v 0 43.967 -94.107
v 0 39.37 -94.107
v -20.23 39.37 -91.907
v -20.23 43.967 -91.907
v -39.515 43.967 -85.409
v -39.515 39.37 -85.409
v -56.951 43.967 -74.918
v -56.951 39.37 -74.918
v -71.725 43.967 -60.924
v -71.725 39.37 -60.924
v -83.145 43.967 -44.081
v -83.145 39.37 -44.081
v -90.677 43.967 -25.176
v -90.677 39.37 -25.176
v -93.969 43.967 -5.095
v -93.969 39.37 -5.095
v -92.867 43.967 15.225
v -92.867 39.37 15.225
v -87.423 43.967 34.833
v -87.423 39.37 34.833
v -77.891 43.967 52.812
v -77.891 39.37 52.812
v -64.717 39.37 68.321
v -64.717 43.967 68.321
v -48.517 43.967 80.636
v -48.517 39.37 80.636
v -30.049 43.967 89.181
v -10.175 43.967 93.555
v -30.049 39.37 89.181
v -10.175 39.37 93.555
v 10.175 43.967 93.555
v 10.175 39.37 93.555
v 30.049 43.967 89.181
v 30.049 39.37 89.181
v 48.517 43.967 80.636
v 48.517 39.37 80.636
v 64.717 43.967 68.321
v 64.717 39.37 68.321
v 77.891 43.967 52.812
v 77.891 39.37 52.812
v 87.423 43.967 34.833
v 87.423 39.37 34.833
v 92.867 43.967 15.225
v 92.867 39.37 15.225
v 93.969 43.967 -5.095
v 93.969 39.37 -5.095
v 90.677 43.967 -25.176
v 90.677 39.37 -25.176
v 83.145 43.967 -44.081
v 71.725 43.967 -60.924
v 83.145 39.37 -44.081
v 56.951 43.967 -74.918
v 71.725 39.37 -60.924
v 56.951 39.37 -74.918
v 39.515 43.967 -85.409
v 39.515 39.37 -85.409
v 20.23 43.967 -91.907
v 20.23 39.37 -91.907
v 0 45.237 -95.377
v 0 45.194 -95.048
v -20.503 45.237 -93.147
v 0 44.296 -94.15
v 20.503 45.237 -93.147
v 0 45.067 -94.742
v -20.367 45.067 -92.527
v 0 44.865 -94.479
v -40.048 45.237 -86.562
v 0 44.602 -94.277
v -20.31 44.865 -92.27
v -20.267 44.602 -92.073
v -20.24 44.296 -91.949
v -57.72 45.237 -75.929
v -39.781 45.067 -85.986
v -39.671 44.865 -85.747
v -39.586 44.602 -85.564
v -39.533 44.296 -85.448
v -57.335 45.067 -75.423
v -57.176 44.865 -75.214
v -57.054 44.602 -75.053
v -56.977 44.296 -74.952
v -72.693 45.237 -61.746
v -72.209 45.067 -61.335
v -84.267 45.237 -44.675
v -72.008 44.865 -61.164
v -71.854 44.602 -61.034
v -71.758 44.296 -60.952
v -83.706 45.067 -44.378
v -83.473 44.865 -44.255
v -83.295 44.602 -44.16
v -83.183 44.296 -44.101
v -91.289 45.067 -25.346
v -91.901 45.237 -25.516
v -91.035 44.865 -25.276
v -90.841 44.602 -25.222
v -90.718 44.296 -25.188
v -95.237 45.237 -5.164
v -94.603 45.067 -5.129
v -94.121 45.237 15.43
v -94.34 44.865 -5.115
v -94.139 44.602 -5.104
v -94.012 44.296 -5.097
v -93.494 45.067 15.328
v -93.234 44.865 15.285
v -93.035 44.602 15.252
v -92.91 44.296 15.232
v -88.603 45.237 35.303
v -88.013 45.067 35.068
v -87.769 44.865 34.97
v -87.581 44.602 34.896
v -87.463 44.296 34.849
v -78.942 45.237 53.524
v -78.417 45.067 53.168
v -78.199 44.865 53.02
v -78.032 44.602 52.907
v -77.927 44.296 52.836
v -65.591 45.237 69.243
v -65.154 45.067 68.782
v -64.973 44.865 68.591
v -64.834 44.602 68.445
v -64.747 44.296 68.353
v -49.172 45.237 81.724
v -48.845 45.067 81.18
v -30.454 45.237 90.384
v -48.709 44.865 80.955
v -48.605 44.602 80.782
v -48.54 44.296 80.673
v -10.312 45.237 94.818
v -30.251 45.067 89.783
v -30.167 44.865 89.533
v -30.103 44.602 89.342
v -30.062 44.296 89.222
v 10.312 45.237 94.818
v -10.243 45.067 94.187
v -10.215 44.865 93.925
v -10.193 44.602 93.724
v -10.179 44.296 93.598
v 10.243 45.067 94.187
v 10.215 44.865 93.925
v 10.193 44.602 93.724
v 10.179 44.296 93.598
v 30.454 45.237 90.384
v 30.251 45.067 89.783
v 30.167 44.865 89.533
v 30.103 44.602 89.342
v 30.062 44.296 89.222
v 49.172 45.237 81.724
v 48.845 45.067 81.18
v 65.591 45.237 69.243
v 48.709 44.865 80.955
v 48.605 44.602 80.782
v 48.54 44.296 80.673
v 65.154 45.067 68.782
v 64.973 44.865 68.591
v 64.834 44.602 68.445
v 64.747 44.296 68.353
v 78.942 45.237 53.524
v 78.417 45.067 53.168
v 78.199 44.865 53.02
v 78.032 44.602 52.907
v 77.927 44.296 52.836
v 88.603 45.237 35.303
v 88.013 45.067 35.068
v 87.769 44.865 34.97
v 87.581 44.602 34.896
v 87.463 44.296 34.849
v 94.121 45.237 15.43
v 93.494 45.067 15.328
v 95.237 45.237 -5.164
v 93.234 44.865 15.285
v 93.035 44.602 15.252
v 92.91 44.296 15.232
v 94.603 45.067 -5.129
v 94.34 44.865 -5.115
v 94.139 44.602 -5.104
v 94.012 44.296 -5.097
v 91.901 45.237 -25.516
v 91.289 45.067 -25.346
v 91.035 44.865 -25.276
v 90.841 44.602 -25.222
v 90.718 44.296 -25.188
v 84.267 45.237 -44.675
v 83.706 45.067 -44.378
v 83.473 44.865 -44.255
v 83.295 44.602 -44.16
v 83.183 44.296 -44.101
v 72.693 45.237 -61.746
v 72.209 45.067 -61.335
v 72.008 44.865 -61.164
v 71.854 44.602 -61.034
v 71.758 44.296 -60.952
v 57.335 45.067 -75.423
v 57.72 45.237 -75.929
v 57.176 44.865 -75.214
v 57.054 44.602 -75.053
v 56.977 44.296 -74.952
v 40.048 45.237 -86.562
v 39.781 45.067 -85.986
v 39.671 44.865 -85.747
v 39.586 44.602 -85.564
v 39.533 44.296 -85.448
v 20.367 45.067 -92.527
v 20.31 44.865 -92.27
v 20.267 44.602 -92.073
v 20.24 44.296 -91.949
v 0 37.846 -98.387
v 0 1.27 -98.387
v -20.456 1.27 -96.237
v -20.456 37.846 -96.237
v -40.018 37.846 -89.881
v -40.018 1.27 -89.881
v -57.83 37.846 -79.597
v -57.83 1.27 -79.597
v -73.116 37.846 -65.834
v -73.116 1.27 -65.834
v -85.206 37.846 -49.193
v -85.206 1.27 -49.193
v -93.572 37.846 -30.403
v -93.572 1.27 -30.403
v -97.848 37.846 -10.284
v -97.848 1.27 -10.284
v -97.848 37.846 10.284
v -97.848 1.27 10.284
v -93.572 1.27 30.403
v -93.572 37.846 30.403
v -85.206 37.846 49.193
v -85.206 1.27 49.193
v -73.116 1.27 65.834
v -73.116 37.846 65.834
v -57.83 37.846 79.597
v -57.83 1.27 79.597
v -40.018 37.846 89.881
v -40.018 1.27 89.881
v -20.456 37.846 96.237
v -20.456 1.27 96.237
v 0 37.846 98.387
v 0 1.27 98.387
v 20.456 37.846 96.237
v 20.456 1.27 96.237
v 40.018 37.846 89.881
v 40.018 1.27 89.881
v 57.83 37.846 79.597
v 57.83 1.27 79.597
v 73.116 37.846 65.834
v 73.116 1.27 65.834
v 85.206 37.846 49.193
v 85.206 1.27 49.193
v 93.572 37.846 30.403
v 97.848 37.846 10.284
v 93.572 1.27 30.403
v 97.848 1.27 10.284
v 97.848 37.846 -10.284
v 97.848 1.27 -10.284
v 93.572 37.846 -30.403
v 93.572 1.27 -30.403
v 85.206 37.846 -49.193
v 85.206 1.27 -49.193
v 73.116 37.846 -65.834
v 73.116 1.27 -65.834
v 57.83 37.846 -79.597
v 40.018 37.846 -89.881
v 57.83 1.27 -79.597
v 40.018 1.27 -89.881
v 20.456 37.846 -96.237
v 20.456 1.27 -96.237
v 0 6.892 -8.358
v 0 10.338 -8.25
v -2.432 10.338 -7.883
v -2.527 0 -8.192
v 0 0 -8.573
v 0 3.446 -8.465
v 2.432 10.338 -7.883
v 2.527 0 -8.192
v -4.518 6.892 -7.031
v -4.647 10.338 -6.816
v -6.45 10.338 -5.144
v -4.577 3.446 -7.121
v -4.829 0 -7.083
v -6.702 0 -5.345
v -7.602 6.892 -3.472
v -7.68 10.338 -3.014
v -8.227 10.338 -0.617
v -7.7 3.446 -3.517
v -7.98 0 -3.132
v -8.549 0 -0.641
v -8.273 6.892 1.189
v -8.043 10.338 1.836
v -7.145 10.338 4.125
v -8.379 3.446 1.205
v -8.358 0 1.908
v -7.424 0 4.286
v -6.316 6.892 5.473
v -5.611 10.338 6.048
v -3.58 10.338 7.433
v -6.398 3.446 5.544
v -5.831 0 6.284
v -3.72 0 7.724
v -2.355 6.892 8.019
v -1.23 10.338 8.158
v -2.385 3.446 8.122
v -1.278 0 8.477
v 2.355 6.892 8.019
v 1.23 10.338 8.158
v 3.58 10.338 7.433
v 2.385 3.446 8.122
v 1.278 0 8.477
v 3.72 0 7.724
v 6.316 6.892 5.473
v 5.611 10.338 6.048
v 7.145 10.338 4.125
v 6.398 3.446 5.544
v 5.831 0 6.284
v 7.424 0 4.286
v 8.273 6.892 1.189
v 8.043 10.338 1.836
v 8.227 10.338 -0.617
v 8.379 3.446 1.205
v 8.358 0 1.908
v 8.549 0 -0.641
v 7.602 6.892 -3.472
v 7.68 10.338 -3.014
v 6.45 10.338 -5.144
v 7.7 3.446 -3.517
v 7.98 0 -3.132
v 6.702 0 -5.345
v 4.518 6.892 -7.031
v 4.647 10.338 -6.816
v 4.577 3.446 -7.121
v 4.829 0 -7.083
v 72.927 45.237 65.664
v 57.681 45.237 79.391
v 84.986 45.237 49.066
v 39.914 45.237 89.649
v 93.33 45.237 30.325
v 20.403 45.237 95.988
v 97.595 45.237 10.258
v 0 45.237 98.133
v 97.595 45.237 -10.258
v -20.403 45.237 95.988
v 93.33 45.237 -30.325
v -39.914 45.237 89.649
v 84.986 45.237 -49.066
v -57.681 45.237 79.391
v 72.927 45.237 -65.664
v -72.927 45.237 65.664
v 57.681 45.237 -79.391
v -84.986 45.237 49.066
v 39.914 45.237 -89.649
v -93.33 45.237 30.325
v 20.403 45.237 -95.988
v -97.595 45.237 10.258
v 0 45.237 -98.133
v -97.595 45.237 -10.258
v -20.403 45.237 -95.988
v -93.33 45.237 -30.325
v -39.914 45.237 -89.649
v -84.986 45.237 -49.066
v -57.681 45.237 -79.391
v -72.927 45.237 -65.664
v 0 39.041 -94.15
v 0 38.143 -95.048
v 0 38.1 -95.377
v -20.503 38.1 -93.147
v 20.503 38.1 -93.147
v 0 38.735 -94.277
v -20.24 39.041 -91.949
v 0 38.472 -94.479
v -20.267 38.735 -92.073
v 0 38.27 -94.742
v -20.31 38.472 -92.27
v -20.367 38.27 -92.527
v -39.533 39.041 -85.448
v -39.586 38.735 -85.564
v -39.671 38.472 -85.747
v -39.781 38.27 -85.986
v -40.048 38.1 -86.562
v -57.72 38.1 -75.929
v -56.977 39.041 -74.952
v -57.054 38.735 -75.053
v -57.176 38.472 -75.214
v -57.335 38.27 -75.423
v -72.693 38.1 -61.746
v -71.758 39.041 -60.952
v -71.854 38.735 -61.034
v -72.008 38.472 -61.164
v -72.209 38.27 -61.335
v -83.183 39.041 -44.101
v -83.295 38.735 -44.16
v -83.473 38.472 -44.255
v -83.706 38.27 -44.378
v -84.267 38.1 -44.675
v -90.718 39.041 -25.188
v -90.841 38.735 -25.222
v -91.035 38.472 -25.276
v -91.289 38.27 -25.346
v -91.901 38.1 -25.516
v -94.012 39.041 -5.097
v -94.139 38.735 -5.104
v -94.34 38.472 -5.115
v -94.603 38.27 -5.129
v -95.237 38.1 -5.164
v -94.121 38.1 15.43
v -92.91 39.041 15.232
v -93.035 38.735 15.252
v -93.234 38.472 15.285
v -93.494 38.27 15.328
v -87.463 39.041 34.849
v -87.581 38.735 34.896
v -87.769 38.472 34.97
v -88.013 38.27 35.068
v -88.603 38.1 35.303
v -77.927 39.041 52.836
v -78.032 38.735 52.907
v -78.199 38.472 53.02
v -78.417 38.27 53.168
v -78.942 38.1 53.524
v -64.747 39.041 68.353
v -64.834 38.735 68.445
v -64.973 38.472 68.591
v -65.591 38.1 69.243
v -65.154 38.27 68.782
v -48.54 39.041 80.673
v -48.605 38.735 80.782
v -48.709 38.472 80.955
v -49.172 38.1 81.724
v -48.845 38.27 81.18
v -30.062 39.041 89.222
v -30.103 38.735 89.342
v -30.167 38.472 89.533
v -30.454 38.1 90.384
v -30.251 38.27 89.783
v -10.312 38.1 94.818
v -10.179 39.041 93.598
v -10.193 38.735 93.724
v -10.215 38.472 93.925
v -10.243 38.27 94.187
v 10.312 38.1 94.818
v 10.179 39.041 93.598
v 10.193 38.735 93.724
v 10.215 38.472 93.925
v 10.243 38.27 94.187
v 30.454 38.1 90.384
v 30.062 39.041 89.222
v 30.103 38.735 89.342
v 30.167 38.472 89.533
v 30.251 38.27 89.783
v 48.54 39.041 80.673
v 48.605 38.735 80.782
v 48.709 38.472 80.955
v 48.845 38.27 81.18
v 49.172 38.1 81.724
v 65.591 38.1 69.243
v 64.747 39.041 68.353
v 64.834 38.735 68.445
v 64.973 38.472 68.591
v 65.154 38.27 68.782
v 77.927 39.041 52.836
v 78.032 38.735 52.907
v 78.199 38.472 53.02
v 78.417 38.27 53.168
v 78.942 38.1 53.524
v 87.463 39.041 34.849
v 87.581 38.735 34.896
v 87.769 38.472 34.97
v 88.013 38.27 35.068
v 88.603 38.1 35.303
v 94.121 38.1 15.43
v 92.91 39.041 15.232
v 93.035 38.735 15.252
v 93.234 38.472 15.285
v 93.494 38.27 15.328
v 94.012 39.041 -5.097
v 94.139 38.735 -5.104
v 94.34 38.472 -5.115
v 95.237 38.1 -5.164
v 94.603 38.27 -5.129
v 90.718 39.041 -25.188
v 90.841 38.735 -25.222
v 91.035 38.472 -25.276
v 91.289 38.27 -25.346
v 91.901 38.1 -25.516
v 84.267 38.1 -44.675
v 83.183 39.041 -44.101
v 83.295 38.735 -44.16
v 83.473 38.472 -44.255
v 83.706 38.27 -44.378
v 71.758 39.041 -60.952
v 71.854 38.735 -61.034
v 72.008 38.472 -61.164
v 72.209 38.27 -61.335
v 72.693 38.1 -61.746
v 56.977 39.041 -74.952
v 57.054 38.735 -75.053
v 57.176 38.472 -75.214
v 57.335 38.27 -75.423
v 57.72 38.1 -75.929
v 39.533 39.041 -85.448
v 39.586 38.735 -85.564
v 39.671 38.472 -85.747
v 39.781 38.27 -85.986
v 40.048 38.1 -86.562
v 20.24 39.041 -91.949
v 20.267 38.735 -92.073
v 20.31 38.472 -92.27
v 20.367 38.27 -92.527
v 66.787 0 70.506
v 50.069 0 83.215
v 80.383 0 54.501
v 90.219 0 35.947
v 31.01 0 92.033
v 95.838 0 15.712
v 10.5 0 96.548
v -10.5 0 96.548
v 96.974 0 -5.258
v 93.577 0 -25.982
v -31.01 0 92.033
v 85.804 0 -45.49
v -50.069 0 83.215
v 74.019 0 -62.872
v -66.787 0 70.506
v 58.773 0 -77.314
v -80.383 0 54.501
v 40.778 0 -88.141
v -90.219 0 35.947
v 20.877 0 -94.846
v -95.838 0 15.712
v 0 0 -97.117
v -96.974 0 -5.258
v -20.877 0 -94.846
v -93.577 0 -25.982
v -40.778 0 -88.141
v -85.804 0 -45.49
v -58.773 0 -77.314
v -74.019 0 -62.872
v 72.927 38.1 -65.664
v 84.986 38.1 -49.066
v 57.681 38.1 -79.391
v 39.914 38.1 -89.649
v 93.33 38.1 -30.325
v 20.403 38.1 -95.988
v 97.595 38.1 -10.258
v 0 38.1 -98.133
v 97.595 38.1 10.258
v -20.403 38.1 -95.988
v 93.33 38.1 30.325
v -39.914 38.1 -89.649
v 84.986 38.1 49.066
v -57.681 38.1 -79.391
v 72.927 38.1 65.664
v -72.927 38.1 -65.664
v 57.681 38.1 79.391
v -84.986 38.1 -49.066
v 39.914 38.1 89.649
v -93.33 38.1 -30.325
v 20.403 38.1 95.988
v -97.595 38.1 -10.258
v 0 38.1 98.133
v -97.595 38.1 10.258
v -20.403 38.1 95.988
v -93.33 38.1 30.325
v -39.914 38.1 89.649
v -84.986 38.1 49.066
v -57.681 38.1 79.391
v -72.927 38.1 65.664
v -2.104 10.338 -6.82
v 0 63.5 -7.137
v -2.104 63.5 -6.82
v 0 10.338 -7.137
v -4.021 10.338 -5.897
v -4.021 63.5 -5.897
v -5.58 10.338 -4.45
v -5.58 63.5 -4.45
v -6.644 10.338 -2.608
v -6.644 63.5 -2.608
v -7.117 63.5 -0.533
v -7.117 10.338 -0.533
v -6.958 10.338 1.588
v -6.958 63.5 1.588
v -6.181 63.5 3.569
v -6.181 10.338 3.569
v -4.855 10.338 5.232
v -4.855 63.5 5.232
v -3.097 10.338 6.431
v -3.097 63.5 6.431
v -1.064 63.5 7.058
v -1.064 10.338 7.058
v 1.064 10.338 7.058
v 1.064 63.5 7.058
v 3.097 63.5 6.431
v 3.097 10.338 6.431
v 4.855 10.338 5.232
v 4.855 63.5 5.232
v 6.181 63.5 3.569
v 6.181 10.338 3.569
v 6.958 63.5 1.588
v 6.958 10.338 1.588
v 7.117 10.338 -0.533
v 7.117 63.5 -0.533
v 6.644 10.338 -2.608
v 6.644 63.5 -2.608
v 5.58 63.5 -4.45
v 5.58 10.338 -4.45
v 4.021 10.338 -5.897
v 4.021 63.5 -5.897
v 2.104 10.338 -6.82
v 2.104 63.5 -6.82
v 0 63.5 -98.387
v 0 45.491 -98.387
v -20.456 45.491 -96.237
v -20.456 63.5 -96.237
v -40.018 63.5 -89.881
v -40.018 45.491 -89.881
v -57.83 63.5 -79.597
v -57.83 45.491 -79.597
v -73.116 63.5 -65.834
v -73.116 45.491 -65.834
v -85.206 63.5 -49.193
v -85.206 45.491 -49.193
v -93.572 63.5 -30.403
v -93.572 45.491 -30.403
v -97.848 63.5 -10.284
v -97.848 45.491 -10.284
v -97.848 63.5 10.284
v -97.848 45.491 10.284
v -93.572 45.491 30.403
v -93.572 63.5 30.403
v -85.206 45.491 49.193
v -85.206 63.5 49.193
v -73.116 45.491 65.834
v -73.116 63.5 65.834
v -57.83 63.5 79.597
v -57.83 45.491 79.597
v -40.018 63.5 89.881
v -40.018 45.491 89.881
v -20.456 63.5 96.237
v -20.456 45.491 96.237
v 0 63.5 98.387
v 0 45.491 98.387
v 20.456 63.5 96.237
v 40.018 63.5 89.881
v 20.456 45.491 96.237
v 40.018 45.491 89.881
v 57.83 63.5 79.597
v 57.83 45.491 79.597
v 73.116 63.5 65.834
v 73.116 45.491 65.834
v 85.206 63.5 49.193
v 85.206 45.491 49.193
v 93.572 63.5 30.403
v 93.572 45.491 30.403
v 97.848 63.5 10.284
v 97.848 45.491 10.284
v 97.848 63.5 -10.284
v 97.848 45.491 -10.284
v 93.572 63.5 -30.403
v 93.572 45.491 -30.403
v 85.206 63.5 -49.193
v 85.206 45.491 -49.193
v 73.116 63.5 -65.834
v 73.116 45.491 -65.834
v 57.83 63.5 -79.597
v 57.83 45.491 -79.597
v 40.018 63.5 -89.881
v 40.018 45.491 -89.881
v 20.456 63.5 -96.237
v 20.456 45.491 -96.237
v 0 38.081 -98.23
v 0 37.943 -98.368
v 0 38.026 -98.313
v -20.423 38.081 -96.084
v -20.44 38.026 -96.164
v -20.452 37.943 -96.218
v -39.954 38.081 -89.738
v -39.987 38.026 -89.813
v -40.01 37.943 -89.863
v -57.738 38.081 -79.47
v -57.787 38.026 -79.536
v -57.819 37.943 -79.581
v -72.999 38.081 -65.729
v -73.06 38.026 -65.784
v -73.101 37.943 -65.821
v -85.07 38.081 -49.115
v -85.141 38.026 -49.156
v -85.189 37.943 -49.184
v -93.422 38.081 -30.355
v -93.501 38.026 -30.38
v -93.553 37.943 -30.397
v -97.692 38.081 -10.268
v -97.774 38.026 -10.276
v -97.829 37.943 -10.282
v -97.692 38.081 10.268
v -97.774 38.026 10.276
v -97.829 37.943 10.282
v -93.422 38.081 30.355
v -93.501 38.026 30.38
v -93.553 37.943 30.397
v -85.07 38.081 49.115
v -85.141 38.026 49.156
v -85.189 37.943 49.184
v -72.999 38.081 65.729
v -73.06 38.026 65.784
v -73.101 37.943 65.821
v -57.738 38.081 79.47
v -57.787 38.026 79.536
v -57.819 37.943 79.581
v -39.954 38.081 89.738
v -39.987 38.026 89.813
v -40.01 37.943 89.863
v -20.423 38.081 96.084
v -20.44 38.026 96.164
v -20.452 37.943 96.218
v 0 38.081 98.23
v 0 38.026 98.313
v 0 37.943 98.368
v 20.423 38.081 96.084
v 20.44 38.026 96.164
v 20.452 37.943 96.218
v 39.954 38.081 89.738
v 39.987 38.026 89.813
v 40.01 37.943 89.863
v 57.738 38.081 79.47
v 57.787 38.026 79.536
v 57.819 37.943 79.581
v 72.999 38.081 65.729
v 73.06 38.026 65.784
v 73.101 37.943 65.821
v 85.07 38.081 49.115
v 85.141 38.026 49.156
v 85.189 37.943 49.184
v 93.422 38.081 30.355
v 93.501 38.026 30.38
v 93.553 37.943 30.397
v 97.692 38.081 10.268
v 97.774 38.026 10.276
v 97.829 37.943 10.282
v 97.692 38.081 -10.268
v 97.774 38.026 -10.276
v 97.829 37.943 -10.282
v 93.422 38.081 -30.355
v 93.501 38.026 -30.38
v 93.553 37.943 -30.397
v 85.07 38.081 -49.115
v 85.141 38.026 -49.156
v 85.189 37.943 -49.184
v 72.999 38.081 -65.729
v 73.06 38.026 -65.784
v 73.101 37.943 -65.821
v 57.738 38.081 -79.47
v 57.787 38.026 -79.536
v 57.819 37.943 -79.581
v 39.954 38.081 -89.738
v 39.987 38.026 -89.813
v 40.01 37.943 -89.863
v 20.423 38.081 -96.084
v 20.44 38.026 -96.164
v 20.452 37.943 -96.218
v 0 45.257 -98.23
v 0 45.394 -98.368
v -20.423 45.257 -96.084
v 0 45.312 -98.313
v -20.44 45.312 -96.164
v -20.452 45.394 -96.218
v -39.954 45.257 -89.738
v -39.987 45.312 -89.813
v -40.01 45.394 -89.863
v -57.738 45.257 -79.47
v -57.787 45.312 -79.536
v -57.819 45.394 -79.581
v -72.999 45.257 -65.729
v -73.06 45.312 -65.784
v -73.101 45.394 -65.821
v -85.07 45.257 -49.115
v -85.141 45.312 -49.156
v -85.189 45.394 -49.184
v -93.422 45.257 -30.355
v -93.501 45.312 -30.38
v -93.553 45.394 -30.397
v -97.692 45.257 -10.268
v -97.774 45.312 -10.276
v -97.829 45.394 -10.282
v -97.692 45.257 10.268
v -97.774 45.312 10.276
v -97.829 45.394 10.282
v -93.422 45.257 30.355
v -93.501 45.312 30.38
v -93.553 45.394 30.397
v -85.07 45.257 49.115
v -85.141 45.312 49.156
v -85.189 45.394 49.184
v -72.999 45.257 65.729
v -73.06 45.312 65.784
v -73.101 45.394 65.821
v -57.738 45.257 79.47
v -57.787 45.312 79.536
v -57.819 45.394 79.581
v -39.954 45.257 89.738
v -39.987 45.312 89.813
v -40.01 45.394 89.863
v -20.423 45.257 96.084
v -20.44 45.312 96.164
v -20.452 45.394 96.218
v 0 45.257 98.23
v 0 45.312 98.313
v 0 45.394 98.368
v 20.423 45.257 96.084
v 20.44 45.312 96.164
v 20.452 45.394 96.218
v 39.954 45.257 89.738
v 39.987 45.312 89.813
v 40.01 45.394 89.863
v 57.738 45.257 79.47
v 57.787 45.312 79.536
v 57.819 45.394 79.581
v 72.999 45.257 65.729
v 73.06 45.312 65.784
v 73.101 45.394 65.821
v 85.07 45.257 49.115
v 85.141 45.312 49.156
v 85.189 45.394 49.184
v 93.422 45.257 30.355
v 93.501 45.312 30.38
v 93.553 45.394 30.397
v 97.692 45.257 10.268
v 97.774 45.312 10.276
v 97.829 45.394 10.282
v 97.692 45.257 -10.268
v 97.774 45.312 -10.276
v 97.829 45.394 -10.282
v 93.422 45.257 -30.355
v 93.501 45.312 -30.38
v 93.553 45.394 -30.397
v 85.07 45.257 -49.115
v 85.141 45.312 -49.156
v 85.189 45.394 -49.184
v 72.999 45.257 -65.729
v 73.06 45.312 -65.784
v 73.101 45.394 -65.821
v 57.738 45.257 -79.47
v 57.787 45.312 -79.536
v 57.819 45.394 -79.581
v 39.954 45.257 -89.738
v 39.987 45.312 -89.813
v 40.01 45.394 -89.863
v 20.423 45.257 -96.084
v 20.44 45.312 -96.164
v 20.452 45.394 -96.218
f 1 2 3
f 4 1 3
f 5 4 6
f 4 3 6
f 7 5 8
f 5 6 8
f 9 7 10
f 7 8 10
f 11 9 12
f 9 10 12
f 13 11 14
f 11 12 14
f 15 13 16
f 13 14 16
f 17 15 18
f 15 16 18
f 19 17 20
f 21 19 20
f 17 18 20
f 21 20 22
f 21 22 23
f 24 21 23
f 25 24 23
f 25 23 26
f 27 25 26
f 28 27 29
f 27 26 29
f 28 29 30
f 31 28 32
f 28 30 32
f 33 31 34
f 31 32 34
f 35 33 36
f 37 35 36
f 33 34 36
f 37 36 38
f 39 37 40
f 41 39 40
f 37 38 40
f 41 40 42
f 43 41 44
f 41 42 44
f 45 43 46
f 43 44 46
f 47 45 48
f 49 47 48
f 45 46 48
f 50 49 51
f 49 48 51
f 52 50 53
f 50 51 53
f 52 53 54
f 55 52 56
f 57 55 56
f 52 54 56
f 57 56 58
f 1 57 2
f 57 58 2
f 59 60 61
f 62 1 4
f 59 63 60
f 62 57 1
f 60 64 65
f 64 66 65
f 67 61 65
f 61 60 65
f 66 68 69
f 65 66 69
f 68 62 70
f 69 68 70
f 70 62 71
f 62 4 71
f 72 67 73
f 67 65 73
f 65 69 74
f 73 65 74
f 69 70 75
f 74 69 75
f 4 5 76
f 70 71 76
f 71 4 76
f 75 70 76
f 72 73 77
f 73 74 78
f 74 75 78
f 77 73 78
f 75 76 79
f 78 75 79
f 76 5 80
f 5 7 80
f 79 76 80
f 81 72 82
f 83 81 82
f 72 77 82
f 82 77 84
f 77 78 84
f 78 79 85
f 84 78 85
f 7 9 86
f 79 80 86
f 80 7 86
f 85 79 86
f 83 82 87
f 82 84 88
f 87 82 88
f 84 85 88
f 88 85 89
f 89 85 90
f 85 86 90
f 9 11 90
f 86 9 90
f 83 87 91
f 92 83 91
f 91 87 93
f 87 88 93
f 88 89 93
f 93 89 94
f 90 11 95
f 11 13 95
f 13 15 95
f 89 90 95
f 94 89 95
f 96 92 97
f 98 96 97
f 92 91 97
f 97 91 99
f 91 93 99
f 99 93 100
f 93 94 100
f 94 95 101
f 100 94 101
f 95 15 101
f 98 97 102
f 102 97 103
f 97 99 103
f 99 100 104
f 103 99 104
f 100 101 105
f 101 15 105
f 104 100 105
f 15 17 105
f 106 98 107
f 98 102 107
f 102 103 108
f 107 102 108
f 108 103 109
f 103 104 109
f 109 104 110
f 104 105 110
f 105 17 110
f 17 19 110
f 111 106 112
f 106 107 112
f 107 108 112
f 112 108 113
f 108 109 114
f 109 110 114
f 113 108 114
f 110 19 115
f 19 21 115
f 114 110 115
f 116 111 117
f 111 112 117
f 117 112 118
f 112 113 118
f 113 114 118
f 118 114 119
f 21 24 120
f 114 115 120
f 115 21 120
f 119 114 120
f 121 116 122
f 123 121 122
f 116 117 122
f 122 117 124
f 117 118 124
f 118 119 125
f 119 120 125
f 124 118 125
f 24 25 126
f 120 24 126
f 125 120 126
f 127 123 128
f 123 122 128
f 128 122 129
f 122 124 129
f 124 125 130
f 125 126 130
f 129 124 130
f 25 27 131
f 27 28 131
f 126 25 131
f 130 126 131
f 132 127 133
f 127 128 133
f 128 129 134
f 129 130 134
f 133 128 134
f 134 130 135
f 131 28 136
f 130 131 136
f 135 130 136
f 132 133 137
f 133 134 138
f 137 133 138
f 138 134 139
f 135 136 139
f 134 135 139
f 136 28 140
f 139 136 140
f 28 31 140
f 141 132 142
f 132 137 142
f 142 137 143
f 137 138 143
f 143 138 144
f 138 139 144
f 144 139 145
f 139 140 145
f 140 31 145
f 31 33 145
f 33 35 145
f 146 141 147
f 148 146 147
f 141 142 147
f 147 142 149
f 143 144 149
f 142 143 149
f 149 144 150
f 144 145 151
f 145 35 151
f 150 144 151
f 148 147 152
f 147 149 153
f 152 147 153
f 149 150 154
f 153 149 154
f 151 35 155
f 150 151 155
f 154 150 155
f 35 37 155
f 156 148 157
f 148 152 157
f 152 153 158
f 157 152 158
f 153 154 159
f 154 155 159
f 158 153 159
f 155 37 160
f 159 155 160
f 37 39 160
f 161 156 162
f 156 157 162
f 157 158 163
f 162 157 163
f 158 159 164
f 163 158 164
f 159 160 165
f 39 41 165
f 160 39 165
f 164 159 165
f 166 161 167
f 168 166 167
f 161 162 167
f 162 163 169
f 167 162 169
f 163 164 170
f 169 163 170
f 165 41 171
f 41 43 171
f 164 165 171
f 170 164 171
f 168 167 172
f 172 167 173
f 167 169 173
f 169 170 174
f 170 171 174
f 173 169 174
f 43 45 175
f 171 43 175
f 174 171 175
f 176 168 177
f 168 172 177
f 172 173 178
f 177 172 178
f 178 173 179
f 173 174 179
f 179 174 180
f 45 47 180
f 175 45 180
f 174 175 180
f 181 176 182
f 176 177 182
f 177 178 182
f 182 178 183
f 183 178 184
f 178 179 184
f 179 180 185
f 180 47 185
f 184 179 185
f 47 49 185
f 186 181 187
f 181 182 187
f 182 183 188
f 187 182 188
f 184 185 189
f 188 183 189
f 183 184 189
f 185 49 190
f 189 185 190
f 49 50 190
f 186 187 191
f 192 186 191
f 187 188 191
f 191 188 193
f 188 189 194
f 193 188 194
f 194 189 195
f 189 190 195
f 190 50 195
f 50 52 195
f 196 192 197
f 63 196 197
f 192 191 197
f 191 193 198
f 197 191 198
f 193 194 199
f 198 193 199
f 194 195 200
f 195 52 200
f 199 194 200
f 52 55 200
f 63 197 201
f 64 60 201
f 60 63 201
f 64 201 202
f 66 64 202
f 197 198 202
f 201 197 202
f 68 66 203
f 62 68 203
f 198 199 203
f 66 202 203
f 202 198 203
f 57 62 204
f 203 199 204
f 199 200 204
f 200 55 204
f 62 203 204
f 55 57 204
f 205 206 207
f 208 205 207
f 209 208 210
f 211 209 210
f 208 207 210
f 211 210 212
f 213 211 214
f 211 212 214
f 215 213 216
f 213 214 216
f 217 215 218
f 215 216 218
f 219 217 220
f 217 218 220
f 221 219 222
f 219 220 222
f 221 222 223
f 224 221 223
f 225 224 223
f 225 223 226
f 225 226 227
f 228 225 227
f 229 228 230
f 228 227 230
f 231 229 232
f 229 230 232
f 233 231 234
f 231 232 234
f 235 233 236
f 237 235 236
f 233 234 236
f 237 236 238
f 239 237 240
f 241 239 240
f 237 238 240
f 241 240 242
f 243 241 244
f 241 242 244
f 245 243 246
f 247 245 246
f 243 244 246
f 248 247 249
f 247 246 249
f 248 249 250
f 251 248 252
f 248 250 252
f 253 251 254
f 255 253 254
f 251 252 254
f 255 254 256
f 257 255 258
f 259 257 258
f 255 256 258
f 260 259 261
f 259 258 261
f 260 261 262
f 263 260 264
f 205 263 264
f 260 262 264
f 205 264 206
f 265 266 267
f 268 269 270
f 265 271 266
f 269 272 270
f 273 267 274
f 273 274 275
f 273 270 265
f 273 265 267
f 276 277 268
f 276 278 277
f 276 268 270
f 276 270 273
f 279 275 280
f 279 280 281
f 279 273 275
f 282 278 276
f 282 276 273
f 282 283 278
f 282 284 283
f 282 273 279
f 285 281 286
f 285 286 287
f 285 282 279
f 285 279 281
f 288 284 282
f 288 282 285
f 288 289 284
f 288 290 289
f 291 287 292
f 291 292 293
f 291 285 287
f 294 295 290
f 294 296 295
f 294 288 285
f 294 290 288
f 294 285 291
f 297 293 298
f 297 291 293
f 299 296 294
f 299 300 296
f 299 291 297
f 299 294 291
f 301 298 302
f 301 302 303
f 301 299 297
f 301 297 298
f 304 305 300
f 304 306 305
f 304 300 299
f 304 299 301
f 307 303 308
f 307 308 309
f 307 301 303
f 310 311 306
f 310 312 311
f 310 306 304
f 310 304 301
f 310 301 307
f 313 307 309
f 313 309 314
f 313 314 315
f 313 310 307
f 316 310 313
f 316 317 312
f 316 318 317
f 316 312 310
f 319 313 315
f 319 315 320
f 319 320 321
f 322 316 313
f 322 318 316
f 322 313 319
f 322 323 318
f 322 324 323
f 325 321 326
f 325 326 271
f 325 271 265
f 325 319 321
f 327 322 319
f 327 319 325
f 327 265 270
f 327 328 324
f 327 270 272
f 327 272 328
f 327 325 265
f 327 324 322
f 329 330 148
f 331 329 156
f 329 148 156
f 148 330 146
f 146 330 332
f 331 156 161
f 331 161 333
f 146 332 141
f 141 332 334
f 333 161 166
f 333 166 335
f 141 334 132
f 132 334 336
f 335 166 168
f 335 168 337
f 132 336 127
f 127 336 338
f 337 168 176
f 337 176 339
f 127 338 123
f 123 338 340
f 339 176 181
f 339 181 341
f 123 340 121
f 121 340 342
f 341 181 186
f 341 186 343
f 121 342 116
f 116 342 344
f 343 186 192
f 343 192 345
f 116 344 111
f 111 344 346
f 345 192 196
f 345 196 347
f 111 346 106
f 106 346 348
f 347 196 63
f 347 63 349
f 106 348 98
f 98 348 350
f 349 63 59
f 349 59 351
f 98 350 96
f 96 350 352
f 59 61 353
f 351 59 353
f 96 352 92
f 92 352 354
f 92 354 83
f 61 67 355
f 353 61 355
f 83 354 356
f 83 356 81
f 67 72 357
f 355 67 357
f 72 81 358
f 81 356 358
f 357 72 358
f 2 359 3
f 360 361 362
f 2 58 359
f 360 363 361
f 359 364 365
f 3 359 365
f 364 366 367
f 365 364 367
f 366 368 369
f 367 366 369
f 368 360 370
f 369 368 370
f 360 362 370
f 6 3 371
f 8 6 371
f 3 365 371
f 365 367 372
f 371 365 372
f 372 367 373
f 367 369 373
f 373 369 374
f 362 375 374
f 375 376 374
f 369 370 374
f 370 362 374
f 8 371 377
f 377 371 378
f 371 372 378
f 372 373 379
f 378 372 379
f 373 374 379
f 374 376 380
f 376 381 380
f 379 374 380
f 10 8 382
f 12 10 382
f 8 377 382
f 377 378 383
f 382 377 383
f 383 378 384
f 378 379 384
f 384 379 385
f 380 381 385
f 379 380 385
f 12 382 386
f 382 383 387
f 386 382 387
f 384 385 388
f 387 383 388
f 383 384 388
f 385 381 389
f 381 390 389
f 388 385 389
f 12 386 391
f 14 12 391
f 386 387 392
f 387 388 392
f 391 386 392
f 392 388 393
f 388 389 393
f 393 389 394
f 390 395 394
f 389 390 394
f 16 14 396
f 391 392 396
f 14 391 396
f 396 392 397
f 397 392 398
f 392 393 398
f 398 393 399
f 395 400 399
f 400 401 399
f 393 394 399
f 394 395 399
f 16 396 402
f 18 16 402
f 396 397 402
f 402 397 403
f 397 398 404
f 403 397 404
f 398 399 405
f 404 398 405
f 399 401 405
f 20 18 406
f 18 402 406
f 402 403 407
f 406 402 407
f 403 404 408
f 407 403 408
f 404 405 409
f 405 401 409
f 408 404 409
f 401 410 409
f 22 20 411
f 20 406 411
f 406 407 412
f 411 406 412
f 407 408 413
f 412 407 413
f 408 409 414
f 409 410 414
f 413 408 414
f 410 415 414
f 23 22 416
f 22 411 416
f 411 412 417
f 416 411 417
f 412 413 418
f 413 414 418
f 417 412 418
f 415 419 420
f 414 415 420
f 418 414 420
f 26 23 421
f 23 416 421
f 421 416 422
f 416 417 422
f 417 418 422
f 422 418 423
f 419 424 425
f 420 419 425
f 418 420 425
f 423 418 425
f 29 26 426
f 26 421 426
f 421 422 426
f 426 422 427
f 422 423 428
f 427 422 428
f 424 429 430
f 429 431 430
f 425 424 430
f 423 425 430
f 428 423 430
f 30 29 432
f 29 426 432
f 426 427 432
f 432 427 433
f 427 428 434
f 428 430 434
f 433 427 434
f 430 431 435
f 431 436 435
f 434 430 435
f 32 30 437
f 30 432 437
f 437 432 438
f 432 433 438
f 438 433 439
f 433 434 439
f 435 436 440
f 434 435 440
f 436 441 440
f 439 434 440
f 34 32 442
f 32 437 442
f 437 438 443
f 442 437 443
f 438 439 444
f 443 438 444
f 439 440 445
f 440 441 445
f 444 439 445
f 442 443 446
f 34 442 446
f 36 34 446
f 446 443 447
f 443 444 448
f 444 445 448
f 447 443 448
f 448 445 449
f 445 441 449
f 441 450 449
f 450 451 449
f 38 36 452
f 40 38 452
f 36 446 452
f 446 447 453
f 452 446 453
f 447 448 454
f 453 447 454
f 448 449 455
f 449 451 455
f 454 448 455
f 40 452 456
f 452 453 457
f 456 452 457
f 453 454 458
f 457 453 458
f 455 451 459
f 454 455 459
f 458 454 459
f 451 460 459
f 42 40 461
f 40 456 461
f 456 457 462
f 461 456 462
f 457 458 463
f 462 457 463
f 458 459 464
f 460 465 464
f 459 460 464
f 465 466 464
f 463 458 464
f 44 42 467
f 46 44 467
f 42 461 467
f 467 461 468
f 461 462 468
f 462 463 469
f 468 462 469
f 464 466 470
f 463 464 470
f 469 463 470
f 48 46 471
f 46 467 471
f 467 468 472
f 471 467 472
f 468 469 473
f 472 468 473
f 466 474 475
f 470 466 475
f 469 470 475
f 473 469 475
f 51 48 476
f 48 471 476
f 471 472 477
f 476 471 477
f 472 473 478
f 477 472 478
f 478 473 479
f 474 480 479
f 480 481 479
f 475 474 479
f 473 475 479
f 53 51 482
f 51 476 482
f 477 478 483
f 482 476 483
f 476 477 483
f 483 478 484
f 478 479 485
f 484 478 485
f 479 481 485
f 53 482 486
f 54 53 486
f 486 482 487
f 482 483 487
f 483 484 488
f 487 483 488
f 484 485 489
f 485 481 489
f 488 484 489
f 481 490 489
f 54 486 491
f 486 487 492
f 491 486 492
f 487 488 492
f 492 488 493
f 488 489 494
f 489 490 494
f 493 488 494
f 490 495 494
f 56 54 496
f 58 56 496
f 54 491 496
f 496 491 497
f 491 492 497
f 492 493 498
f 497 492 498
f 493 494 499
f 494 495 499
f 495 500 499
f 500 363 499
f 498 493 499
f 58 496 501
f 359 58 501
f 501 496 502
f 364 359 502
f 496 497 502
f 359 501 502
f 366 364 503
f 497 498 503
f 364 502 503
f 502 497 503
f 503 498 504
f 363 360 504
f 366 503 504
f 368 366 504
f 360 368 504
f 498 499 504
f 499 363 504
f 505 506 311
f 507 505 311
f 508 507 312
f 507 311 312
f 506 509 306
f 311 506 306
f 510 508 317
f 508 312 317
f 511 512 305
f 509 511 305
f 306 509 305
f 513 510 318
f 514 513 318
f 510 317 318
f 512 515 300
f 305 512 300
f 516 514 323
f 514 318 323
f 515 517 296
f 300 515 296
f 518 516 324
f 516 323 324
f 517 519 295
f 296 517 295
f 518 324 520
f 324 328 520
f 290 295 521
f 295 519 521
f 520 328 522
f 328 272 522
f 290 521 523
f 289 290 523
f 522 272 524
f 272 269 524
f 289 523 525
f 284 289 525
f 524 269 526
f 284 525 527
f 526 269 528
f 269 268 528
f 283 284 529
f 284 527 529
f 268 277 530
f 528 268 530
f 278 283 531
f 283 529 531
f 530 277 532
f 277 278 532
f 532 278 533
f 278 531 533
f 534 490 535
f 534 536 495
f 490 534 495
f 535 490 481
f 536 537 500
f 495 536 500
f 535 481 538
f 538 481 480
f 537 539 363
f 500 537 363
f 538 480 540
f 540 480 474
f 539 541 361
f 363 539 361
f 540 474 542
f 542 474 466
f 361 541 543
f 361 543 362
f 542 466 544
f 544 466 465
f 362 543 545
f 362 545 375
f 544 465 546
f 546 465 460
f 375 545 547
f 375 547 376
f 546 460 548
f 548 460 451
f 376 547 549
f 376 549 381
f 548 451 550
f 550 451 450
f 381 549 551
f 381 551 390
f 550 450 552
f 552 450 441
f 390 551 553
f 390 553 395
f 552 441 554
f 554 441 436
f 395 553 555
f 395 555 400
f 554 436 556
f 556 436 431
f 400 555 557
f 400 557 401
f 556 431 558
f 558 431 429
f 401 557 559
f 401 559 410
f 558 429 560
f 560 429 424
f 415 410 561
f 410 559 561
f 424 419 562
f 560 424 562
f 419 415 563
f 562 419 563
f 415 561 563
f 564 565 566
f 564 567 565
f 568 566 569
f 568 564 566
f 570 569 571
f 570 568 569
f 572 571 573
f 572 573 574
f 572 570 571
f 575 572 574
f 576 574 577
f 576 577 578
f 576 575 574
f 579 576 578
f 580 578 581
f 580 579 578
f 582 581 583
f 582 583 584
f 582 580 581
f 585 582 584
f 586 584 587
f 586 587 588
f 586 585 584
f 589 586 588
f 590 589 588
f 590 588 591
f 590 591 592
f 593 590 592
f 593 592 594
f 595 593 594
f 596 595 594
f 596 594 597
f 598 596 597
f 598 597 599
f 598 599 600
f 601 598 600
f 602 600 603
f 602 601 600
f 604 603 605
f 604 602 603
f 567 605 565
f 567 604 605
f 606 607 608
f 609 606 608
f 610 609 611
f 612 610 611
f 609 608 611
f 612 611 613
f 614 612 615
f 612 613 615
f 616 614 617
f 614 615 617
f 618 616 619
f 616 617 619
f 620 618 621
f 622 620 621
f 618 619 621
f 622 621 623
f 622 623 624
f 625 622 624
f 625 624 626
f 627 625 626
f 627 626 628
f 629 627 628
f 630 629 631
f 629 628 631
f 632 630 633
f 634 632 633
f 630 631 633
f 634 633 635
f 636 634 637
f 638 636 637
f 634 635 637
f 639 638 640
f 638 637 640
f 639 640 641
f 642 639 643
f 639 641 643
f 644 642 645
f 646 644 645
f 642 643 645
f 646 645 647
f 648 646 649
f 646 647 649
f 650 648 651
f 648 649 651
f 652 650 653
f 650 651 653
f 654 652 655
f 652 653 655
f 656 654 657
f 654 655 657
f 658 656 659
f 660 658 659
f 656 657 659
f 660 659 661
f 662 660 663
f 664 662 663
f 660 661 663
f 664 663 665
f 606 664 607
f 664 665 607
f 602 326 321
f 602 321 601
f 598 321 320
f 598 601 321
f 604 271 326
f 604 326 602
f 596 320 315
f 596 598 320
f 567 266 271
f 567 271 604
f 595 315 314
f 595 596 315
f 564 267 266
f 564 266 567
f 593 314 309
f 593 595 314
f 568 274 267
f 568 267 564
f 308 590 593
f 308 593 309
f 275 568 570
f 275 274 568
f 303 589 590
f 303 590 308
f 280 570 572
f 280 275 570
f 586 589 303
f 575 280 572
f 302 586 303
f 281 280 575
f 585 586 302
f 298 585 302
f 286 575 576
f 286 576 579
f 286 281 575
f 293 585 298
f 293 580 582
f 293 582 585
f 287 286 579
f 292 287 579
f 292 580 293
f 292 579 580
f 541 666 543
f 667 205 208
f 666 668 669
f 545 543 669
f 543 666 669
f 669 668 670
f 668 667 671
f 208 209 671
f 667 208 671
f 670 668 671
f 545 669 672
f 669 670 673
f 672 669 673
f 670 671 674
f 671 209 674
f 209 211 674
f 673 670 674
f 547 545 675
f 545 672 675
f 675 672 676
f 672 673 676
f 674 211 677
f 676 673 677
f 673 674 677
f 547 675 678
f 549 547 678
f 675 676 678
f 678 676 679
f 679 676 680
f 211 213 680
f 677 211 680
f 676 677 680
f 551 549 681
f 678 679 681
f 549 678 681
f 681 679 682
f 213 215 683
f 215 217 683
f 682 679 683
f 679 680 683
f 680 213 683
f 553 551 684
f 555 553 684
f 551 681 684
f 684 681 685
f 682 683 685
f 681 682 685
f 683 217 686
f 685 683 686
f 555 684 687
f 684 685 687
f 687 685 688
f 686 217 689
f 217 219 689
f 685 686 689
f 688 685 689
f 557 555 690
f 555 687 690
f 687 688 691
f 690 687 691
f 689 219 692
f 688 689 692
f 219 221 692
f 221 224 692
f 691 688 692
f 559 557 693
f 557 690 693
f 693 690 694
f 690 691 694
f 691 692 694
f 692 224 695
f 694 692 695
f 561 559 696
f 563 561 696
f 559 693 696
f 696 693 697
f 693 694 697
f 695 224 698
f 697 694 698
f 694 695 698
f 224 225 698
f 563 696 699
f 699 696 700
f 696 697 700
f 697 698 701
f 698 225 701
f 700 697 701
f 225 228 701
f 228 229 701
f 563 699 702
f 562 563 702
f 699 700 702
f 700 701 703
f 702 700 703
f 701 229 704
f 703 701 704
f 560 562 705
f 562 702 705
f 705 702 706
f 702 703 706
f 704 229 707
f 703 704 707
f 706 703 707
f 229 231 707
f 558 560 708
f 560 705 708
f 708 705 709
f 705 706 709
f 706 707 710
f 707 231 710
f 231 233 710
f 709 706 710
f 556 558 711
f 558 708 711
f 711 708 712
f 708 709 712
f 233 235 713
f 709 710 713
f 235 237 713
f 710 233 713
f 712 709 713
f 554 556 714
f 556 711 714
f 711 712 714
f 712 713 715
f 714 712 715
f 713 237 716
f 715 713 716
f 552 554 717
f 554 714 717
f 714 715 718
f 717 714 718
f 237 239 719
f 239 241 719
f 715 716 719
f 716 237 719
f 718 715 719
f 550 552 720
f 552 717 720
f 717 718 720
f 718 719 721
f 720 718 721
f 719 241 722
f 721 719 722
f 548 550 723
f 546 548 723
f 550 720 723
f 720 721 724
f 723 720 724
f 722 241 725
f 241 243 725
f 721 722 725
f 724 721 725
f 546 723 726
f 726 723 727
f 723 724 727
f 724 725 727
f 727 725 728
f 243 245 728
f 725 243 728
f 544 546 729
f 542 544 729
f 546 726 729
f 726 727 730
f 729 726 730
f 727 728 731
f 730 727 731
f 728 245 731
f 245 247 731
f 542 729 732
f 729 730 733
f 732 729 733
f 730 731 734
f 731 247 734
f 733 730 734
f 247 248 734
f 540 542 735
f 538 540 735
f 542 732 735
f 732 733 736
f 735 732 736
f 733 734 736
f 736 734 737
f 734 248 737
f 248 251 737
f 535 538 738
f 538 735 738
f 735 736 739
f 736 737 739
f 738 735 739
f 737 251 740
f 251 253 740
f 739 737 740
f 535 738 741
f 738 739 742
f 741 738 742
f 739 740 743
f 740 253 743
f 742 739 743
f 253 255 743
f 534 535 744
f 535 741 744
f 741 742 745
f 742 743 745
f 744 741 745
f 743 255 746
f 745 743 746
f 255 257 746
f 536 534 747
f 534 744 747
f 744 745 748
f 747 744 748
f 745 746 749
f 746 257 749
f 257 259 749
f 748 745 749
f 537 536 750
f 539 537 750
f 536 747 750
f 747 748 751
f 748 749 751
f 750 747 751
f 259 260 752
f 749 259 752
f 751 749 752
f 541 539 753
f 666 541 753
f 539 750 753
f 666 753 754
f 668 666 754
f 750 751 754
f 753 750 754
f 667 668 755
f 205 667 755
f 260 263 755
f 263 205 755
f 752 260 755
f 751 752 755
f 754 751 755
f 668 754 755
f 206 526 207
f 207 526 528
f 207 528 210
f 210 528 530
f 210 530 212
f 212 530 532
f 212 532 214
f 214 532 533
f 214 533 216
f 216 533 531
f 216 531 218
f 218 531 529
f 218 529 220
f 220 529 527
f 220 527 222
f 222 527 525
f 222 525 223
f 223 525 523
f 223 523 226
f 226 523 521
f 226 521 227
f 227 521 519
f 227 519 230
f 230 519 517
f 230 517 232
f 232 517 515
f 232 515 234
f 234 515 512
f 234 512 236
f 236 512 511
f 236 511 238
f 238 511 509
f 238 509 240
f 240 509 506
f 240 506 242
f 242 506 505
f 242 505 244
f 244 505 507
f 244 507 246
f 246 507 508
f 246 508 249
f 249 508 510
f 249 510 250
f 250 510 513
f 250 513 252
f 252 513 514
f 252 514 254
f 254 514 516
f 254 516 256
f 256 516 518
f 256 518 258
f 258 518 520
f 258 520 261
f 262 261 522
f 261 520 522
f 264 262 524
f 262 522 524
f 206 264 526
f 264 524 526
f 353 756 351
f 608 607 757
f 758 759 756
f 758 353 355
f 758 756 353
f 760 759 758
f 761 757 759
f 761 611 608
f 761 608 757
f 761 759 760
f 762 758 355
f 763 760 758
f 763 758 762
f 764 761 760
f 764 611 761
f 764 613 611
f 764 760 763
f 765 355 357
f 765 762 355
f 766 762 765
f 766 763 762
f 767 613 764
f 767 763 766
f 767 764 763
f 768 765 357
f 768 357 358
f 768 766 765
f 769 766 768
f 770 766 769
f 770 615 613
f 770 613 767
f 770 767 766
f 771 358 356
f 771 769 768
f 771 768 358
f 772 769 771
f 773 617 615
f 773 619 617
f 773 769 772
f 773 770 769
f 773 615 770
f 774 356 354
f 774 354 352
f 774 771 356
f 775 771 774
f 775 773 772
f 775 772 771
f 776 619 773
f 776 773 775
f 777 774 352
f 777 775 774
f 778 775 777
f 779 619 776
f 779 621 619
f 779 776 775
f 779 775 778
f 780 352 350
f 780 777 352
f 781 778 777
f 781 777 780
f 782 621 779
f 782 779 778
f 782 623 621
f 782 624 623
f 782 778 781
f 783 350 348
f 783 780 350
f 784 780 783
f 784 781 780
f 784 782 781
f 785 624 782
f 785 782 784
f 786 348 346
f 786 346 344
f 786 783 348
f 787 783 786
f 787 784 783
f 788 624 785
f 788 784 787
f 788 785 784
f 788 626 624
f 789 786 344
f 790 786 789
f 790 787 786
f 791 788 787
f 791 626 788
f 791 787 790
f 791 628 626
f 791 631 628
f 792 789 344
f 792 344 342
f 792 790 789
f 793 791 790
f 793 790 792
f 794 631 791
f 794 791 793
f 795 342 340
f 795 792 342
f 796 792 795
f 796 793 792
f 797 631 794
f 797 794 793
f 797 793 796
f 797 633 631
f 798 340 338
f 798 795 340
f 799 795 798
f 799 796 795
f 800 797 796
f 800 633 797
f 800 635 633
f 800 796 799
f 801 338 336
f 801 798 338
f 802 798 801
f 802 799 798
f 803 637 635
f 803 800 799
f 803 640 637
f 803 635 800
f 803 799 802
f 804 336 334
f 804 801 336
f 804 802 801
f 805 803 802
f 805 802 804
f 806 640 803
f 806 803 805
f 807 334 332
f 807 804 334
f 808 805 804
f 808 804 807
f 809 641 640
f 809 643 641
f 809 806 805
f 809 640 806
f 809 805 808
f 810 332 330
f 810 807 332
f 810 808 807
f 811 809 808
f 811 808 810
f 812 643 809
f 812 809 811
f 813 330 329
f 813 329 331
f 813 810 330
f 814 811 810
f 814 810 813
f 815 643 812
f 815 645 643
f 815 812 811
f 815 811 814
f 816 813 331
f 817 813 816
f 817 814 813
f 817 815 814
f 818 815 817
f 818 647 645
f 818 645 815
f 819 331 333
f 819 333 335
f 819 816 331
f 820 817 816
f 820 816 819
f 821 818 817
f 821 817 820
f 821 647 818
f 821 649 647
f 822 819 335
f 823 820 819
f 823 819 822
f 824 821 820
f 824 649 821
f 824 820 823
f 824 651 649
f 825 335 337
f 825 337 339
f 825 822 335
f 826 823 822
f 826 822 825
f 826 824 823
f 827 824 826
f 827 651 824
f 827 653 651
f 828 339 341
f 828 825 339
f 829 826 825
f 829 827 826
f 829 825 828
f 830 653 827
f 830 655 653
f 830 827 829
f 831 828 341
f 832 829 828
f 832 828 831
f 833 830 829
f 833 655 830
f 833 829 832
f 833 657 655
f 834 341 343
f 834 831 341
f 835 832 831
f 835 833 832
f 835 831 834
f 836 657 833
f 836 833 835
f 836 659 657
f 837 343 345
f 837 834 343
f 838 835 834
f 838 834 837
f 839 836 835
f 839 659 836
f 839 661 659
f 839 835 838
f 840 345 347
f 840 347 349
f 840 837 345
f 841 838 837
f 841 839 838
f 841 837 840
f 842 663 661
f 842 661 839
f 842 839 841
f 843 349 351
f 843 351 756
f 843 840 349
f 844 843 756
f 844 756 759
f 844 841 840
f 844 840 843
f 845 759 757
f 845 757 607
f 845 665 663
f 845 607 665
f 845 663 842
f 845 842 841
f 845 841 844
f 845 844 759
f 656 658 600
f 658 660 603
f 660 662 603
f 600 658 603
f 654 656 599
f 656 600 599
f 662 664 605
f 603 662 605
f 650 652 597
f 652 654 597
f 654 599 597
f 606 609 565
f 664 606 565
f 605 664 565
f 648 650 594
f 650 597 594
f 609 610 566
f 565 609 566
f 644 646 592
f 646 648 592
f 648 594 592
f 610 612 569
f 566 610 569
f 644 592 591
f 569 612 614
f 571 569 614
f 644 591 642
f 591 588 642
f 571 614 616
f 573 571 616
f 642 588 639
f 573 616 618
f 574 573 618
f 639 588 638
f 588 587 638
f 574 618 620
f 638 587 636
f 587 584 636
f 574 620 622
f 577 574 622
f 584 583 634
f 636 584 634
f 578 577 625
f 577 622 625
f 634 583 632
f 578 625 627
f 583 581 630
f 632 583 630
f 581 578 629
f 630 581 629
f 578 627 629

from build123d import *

# Parameters (mm, degrees)
FILLET1_R     = 1.27
FILLET2_R     = 0.254
CHAMFER1_SIZE = 1.27


with BuildPart() as part:
    # Sketch1 → Revolve1 (revolve)
    with BuildSketch(Plane.XY, mode=Mode.PRIVATE) as revolve1_sk:
        Polygon((0, 0), (0, 63.5), (-98.3869, 63.5), (-98.3869, 45.2374), (-94.107, 45.2374), (-94.107, 38.1), (-98.3869, 38.1), (-98.3869, 6.551201717), (-98.3869, 0), align=None)
    revolve(revolve1_sk.sketch.rotate(Axis((0, 0, 0), (0, 1, 0)), 270), axis=Axis((0, 0, 0), (0, 1, 0)))

    # Fillet1
    fillet1_edges = [part.edges().sort_by_distance(p)[0] for p in [
        (0, 38.1, 94.107),
        (0, 45.2374, 94.107),
    ]]
    fillet(fillet1_edges, radius=FILLET1_R)

    # Fillet2
    fillet2_edges = [part.edges().sort_by_distance(p)[0] for p in [
        (0, 38.1, 98.3869),
        (0, 45.2374, 98.3869),
    ]]
    fillet(fillet2_edges, radius=FILLET2_R)

    # Chamfer1
    chamfer1_edges = [part.edges().sort_by_distance(p)[0] for p in [
        (0, 0, 98.3869),
    ]]
    chamfer(chamfer1_edges, length=CHAMFER1_SIZE)

    # Sketch7 → 3/8 NPT Tapped Hole3 (revolve, cut)
    with BuildSketch(Plane(origin=(0, 0, 0), x_dir=(0, 0, -1), z_dir=(1, 0, 0))):
        Polygon((0, 0), (0, 63.5), (7.1374, 63.5), (7.1374, 10.3378), (8.250003024, 10.3378), (8.5727413, 0), align=None)
    revolve(axis=Axis((0, -6.35, 0), (0, 1, 0)), mode=Mode.SUBTRACT)


solid = part.part
